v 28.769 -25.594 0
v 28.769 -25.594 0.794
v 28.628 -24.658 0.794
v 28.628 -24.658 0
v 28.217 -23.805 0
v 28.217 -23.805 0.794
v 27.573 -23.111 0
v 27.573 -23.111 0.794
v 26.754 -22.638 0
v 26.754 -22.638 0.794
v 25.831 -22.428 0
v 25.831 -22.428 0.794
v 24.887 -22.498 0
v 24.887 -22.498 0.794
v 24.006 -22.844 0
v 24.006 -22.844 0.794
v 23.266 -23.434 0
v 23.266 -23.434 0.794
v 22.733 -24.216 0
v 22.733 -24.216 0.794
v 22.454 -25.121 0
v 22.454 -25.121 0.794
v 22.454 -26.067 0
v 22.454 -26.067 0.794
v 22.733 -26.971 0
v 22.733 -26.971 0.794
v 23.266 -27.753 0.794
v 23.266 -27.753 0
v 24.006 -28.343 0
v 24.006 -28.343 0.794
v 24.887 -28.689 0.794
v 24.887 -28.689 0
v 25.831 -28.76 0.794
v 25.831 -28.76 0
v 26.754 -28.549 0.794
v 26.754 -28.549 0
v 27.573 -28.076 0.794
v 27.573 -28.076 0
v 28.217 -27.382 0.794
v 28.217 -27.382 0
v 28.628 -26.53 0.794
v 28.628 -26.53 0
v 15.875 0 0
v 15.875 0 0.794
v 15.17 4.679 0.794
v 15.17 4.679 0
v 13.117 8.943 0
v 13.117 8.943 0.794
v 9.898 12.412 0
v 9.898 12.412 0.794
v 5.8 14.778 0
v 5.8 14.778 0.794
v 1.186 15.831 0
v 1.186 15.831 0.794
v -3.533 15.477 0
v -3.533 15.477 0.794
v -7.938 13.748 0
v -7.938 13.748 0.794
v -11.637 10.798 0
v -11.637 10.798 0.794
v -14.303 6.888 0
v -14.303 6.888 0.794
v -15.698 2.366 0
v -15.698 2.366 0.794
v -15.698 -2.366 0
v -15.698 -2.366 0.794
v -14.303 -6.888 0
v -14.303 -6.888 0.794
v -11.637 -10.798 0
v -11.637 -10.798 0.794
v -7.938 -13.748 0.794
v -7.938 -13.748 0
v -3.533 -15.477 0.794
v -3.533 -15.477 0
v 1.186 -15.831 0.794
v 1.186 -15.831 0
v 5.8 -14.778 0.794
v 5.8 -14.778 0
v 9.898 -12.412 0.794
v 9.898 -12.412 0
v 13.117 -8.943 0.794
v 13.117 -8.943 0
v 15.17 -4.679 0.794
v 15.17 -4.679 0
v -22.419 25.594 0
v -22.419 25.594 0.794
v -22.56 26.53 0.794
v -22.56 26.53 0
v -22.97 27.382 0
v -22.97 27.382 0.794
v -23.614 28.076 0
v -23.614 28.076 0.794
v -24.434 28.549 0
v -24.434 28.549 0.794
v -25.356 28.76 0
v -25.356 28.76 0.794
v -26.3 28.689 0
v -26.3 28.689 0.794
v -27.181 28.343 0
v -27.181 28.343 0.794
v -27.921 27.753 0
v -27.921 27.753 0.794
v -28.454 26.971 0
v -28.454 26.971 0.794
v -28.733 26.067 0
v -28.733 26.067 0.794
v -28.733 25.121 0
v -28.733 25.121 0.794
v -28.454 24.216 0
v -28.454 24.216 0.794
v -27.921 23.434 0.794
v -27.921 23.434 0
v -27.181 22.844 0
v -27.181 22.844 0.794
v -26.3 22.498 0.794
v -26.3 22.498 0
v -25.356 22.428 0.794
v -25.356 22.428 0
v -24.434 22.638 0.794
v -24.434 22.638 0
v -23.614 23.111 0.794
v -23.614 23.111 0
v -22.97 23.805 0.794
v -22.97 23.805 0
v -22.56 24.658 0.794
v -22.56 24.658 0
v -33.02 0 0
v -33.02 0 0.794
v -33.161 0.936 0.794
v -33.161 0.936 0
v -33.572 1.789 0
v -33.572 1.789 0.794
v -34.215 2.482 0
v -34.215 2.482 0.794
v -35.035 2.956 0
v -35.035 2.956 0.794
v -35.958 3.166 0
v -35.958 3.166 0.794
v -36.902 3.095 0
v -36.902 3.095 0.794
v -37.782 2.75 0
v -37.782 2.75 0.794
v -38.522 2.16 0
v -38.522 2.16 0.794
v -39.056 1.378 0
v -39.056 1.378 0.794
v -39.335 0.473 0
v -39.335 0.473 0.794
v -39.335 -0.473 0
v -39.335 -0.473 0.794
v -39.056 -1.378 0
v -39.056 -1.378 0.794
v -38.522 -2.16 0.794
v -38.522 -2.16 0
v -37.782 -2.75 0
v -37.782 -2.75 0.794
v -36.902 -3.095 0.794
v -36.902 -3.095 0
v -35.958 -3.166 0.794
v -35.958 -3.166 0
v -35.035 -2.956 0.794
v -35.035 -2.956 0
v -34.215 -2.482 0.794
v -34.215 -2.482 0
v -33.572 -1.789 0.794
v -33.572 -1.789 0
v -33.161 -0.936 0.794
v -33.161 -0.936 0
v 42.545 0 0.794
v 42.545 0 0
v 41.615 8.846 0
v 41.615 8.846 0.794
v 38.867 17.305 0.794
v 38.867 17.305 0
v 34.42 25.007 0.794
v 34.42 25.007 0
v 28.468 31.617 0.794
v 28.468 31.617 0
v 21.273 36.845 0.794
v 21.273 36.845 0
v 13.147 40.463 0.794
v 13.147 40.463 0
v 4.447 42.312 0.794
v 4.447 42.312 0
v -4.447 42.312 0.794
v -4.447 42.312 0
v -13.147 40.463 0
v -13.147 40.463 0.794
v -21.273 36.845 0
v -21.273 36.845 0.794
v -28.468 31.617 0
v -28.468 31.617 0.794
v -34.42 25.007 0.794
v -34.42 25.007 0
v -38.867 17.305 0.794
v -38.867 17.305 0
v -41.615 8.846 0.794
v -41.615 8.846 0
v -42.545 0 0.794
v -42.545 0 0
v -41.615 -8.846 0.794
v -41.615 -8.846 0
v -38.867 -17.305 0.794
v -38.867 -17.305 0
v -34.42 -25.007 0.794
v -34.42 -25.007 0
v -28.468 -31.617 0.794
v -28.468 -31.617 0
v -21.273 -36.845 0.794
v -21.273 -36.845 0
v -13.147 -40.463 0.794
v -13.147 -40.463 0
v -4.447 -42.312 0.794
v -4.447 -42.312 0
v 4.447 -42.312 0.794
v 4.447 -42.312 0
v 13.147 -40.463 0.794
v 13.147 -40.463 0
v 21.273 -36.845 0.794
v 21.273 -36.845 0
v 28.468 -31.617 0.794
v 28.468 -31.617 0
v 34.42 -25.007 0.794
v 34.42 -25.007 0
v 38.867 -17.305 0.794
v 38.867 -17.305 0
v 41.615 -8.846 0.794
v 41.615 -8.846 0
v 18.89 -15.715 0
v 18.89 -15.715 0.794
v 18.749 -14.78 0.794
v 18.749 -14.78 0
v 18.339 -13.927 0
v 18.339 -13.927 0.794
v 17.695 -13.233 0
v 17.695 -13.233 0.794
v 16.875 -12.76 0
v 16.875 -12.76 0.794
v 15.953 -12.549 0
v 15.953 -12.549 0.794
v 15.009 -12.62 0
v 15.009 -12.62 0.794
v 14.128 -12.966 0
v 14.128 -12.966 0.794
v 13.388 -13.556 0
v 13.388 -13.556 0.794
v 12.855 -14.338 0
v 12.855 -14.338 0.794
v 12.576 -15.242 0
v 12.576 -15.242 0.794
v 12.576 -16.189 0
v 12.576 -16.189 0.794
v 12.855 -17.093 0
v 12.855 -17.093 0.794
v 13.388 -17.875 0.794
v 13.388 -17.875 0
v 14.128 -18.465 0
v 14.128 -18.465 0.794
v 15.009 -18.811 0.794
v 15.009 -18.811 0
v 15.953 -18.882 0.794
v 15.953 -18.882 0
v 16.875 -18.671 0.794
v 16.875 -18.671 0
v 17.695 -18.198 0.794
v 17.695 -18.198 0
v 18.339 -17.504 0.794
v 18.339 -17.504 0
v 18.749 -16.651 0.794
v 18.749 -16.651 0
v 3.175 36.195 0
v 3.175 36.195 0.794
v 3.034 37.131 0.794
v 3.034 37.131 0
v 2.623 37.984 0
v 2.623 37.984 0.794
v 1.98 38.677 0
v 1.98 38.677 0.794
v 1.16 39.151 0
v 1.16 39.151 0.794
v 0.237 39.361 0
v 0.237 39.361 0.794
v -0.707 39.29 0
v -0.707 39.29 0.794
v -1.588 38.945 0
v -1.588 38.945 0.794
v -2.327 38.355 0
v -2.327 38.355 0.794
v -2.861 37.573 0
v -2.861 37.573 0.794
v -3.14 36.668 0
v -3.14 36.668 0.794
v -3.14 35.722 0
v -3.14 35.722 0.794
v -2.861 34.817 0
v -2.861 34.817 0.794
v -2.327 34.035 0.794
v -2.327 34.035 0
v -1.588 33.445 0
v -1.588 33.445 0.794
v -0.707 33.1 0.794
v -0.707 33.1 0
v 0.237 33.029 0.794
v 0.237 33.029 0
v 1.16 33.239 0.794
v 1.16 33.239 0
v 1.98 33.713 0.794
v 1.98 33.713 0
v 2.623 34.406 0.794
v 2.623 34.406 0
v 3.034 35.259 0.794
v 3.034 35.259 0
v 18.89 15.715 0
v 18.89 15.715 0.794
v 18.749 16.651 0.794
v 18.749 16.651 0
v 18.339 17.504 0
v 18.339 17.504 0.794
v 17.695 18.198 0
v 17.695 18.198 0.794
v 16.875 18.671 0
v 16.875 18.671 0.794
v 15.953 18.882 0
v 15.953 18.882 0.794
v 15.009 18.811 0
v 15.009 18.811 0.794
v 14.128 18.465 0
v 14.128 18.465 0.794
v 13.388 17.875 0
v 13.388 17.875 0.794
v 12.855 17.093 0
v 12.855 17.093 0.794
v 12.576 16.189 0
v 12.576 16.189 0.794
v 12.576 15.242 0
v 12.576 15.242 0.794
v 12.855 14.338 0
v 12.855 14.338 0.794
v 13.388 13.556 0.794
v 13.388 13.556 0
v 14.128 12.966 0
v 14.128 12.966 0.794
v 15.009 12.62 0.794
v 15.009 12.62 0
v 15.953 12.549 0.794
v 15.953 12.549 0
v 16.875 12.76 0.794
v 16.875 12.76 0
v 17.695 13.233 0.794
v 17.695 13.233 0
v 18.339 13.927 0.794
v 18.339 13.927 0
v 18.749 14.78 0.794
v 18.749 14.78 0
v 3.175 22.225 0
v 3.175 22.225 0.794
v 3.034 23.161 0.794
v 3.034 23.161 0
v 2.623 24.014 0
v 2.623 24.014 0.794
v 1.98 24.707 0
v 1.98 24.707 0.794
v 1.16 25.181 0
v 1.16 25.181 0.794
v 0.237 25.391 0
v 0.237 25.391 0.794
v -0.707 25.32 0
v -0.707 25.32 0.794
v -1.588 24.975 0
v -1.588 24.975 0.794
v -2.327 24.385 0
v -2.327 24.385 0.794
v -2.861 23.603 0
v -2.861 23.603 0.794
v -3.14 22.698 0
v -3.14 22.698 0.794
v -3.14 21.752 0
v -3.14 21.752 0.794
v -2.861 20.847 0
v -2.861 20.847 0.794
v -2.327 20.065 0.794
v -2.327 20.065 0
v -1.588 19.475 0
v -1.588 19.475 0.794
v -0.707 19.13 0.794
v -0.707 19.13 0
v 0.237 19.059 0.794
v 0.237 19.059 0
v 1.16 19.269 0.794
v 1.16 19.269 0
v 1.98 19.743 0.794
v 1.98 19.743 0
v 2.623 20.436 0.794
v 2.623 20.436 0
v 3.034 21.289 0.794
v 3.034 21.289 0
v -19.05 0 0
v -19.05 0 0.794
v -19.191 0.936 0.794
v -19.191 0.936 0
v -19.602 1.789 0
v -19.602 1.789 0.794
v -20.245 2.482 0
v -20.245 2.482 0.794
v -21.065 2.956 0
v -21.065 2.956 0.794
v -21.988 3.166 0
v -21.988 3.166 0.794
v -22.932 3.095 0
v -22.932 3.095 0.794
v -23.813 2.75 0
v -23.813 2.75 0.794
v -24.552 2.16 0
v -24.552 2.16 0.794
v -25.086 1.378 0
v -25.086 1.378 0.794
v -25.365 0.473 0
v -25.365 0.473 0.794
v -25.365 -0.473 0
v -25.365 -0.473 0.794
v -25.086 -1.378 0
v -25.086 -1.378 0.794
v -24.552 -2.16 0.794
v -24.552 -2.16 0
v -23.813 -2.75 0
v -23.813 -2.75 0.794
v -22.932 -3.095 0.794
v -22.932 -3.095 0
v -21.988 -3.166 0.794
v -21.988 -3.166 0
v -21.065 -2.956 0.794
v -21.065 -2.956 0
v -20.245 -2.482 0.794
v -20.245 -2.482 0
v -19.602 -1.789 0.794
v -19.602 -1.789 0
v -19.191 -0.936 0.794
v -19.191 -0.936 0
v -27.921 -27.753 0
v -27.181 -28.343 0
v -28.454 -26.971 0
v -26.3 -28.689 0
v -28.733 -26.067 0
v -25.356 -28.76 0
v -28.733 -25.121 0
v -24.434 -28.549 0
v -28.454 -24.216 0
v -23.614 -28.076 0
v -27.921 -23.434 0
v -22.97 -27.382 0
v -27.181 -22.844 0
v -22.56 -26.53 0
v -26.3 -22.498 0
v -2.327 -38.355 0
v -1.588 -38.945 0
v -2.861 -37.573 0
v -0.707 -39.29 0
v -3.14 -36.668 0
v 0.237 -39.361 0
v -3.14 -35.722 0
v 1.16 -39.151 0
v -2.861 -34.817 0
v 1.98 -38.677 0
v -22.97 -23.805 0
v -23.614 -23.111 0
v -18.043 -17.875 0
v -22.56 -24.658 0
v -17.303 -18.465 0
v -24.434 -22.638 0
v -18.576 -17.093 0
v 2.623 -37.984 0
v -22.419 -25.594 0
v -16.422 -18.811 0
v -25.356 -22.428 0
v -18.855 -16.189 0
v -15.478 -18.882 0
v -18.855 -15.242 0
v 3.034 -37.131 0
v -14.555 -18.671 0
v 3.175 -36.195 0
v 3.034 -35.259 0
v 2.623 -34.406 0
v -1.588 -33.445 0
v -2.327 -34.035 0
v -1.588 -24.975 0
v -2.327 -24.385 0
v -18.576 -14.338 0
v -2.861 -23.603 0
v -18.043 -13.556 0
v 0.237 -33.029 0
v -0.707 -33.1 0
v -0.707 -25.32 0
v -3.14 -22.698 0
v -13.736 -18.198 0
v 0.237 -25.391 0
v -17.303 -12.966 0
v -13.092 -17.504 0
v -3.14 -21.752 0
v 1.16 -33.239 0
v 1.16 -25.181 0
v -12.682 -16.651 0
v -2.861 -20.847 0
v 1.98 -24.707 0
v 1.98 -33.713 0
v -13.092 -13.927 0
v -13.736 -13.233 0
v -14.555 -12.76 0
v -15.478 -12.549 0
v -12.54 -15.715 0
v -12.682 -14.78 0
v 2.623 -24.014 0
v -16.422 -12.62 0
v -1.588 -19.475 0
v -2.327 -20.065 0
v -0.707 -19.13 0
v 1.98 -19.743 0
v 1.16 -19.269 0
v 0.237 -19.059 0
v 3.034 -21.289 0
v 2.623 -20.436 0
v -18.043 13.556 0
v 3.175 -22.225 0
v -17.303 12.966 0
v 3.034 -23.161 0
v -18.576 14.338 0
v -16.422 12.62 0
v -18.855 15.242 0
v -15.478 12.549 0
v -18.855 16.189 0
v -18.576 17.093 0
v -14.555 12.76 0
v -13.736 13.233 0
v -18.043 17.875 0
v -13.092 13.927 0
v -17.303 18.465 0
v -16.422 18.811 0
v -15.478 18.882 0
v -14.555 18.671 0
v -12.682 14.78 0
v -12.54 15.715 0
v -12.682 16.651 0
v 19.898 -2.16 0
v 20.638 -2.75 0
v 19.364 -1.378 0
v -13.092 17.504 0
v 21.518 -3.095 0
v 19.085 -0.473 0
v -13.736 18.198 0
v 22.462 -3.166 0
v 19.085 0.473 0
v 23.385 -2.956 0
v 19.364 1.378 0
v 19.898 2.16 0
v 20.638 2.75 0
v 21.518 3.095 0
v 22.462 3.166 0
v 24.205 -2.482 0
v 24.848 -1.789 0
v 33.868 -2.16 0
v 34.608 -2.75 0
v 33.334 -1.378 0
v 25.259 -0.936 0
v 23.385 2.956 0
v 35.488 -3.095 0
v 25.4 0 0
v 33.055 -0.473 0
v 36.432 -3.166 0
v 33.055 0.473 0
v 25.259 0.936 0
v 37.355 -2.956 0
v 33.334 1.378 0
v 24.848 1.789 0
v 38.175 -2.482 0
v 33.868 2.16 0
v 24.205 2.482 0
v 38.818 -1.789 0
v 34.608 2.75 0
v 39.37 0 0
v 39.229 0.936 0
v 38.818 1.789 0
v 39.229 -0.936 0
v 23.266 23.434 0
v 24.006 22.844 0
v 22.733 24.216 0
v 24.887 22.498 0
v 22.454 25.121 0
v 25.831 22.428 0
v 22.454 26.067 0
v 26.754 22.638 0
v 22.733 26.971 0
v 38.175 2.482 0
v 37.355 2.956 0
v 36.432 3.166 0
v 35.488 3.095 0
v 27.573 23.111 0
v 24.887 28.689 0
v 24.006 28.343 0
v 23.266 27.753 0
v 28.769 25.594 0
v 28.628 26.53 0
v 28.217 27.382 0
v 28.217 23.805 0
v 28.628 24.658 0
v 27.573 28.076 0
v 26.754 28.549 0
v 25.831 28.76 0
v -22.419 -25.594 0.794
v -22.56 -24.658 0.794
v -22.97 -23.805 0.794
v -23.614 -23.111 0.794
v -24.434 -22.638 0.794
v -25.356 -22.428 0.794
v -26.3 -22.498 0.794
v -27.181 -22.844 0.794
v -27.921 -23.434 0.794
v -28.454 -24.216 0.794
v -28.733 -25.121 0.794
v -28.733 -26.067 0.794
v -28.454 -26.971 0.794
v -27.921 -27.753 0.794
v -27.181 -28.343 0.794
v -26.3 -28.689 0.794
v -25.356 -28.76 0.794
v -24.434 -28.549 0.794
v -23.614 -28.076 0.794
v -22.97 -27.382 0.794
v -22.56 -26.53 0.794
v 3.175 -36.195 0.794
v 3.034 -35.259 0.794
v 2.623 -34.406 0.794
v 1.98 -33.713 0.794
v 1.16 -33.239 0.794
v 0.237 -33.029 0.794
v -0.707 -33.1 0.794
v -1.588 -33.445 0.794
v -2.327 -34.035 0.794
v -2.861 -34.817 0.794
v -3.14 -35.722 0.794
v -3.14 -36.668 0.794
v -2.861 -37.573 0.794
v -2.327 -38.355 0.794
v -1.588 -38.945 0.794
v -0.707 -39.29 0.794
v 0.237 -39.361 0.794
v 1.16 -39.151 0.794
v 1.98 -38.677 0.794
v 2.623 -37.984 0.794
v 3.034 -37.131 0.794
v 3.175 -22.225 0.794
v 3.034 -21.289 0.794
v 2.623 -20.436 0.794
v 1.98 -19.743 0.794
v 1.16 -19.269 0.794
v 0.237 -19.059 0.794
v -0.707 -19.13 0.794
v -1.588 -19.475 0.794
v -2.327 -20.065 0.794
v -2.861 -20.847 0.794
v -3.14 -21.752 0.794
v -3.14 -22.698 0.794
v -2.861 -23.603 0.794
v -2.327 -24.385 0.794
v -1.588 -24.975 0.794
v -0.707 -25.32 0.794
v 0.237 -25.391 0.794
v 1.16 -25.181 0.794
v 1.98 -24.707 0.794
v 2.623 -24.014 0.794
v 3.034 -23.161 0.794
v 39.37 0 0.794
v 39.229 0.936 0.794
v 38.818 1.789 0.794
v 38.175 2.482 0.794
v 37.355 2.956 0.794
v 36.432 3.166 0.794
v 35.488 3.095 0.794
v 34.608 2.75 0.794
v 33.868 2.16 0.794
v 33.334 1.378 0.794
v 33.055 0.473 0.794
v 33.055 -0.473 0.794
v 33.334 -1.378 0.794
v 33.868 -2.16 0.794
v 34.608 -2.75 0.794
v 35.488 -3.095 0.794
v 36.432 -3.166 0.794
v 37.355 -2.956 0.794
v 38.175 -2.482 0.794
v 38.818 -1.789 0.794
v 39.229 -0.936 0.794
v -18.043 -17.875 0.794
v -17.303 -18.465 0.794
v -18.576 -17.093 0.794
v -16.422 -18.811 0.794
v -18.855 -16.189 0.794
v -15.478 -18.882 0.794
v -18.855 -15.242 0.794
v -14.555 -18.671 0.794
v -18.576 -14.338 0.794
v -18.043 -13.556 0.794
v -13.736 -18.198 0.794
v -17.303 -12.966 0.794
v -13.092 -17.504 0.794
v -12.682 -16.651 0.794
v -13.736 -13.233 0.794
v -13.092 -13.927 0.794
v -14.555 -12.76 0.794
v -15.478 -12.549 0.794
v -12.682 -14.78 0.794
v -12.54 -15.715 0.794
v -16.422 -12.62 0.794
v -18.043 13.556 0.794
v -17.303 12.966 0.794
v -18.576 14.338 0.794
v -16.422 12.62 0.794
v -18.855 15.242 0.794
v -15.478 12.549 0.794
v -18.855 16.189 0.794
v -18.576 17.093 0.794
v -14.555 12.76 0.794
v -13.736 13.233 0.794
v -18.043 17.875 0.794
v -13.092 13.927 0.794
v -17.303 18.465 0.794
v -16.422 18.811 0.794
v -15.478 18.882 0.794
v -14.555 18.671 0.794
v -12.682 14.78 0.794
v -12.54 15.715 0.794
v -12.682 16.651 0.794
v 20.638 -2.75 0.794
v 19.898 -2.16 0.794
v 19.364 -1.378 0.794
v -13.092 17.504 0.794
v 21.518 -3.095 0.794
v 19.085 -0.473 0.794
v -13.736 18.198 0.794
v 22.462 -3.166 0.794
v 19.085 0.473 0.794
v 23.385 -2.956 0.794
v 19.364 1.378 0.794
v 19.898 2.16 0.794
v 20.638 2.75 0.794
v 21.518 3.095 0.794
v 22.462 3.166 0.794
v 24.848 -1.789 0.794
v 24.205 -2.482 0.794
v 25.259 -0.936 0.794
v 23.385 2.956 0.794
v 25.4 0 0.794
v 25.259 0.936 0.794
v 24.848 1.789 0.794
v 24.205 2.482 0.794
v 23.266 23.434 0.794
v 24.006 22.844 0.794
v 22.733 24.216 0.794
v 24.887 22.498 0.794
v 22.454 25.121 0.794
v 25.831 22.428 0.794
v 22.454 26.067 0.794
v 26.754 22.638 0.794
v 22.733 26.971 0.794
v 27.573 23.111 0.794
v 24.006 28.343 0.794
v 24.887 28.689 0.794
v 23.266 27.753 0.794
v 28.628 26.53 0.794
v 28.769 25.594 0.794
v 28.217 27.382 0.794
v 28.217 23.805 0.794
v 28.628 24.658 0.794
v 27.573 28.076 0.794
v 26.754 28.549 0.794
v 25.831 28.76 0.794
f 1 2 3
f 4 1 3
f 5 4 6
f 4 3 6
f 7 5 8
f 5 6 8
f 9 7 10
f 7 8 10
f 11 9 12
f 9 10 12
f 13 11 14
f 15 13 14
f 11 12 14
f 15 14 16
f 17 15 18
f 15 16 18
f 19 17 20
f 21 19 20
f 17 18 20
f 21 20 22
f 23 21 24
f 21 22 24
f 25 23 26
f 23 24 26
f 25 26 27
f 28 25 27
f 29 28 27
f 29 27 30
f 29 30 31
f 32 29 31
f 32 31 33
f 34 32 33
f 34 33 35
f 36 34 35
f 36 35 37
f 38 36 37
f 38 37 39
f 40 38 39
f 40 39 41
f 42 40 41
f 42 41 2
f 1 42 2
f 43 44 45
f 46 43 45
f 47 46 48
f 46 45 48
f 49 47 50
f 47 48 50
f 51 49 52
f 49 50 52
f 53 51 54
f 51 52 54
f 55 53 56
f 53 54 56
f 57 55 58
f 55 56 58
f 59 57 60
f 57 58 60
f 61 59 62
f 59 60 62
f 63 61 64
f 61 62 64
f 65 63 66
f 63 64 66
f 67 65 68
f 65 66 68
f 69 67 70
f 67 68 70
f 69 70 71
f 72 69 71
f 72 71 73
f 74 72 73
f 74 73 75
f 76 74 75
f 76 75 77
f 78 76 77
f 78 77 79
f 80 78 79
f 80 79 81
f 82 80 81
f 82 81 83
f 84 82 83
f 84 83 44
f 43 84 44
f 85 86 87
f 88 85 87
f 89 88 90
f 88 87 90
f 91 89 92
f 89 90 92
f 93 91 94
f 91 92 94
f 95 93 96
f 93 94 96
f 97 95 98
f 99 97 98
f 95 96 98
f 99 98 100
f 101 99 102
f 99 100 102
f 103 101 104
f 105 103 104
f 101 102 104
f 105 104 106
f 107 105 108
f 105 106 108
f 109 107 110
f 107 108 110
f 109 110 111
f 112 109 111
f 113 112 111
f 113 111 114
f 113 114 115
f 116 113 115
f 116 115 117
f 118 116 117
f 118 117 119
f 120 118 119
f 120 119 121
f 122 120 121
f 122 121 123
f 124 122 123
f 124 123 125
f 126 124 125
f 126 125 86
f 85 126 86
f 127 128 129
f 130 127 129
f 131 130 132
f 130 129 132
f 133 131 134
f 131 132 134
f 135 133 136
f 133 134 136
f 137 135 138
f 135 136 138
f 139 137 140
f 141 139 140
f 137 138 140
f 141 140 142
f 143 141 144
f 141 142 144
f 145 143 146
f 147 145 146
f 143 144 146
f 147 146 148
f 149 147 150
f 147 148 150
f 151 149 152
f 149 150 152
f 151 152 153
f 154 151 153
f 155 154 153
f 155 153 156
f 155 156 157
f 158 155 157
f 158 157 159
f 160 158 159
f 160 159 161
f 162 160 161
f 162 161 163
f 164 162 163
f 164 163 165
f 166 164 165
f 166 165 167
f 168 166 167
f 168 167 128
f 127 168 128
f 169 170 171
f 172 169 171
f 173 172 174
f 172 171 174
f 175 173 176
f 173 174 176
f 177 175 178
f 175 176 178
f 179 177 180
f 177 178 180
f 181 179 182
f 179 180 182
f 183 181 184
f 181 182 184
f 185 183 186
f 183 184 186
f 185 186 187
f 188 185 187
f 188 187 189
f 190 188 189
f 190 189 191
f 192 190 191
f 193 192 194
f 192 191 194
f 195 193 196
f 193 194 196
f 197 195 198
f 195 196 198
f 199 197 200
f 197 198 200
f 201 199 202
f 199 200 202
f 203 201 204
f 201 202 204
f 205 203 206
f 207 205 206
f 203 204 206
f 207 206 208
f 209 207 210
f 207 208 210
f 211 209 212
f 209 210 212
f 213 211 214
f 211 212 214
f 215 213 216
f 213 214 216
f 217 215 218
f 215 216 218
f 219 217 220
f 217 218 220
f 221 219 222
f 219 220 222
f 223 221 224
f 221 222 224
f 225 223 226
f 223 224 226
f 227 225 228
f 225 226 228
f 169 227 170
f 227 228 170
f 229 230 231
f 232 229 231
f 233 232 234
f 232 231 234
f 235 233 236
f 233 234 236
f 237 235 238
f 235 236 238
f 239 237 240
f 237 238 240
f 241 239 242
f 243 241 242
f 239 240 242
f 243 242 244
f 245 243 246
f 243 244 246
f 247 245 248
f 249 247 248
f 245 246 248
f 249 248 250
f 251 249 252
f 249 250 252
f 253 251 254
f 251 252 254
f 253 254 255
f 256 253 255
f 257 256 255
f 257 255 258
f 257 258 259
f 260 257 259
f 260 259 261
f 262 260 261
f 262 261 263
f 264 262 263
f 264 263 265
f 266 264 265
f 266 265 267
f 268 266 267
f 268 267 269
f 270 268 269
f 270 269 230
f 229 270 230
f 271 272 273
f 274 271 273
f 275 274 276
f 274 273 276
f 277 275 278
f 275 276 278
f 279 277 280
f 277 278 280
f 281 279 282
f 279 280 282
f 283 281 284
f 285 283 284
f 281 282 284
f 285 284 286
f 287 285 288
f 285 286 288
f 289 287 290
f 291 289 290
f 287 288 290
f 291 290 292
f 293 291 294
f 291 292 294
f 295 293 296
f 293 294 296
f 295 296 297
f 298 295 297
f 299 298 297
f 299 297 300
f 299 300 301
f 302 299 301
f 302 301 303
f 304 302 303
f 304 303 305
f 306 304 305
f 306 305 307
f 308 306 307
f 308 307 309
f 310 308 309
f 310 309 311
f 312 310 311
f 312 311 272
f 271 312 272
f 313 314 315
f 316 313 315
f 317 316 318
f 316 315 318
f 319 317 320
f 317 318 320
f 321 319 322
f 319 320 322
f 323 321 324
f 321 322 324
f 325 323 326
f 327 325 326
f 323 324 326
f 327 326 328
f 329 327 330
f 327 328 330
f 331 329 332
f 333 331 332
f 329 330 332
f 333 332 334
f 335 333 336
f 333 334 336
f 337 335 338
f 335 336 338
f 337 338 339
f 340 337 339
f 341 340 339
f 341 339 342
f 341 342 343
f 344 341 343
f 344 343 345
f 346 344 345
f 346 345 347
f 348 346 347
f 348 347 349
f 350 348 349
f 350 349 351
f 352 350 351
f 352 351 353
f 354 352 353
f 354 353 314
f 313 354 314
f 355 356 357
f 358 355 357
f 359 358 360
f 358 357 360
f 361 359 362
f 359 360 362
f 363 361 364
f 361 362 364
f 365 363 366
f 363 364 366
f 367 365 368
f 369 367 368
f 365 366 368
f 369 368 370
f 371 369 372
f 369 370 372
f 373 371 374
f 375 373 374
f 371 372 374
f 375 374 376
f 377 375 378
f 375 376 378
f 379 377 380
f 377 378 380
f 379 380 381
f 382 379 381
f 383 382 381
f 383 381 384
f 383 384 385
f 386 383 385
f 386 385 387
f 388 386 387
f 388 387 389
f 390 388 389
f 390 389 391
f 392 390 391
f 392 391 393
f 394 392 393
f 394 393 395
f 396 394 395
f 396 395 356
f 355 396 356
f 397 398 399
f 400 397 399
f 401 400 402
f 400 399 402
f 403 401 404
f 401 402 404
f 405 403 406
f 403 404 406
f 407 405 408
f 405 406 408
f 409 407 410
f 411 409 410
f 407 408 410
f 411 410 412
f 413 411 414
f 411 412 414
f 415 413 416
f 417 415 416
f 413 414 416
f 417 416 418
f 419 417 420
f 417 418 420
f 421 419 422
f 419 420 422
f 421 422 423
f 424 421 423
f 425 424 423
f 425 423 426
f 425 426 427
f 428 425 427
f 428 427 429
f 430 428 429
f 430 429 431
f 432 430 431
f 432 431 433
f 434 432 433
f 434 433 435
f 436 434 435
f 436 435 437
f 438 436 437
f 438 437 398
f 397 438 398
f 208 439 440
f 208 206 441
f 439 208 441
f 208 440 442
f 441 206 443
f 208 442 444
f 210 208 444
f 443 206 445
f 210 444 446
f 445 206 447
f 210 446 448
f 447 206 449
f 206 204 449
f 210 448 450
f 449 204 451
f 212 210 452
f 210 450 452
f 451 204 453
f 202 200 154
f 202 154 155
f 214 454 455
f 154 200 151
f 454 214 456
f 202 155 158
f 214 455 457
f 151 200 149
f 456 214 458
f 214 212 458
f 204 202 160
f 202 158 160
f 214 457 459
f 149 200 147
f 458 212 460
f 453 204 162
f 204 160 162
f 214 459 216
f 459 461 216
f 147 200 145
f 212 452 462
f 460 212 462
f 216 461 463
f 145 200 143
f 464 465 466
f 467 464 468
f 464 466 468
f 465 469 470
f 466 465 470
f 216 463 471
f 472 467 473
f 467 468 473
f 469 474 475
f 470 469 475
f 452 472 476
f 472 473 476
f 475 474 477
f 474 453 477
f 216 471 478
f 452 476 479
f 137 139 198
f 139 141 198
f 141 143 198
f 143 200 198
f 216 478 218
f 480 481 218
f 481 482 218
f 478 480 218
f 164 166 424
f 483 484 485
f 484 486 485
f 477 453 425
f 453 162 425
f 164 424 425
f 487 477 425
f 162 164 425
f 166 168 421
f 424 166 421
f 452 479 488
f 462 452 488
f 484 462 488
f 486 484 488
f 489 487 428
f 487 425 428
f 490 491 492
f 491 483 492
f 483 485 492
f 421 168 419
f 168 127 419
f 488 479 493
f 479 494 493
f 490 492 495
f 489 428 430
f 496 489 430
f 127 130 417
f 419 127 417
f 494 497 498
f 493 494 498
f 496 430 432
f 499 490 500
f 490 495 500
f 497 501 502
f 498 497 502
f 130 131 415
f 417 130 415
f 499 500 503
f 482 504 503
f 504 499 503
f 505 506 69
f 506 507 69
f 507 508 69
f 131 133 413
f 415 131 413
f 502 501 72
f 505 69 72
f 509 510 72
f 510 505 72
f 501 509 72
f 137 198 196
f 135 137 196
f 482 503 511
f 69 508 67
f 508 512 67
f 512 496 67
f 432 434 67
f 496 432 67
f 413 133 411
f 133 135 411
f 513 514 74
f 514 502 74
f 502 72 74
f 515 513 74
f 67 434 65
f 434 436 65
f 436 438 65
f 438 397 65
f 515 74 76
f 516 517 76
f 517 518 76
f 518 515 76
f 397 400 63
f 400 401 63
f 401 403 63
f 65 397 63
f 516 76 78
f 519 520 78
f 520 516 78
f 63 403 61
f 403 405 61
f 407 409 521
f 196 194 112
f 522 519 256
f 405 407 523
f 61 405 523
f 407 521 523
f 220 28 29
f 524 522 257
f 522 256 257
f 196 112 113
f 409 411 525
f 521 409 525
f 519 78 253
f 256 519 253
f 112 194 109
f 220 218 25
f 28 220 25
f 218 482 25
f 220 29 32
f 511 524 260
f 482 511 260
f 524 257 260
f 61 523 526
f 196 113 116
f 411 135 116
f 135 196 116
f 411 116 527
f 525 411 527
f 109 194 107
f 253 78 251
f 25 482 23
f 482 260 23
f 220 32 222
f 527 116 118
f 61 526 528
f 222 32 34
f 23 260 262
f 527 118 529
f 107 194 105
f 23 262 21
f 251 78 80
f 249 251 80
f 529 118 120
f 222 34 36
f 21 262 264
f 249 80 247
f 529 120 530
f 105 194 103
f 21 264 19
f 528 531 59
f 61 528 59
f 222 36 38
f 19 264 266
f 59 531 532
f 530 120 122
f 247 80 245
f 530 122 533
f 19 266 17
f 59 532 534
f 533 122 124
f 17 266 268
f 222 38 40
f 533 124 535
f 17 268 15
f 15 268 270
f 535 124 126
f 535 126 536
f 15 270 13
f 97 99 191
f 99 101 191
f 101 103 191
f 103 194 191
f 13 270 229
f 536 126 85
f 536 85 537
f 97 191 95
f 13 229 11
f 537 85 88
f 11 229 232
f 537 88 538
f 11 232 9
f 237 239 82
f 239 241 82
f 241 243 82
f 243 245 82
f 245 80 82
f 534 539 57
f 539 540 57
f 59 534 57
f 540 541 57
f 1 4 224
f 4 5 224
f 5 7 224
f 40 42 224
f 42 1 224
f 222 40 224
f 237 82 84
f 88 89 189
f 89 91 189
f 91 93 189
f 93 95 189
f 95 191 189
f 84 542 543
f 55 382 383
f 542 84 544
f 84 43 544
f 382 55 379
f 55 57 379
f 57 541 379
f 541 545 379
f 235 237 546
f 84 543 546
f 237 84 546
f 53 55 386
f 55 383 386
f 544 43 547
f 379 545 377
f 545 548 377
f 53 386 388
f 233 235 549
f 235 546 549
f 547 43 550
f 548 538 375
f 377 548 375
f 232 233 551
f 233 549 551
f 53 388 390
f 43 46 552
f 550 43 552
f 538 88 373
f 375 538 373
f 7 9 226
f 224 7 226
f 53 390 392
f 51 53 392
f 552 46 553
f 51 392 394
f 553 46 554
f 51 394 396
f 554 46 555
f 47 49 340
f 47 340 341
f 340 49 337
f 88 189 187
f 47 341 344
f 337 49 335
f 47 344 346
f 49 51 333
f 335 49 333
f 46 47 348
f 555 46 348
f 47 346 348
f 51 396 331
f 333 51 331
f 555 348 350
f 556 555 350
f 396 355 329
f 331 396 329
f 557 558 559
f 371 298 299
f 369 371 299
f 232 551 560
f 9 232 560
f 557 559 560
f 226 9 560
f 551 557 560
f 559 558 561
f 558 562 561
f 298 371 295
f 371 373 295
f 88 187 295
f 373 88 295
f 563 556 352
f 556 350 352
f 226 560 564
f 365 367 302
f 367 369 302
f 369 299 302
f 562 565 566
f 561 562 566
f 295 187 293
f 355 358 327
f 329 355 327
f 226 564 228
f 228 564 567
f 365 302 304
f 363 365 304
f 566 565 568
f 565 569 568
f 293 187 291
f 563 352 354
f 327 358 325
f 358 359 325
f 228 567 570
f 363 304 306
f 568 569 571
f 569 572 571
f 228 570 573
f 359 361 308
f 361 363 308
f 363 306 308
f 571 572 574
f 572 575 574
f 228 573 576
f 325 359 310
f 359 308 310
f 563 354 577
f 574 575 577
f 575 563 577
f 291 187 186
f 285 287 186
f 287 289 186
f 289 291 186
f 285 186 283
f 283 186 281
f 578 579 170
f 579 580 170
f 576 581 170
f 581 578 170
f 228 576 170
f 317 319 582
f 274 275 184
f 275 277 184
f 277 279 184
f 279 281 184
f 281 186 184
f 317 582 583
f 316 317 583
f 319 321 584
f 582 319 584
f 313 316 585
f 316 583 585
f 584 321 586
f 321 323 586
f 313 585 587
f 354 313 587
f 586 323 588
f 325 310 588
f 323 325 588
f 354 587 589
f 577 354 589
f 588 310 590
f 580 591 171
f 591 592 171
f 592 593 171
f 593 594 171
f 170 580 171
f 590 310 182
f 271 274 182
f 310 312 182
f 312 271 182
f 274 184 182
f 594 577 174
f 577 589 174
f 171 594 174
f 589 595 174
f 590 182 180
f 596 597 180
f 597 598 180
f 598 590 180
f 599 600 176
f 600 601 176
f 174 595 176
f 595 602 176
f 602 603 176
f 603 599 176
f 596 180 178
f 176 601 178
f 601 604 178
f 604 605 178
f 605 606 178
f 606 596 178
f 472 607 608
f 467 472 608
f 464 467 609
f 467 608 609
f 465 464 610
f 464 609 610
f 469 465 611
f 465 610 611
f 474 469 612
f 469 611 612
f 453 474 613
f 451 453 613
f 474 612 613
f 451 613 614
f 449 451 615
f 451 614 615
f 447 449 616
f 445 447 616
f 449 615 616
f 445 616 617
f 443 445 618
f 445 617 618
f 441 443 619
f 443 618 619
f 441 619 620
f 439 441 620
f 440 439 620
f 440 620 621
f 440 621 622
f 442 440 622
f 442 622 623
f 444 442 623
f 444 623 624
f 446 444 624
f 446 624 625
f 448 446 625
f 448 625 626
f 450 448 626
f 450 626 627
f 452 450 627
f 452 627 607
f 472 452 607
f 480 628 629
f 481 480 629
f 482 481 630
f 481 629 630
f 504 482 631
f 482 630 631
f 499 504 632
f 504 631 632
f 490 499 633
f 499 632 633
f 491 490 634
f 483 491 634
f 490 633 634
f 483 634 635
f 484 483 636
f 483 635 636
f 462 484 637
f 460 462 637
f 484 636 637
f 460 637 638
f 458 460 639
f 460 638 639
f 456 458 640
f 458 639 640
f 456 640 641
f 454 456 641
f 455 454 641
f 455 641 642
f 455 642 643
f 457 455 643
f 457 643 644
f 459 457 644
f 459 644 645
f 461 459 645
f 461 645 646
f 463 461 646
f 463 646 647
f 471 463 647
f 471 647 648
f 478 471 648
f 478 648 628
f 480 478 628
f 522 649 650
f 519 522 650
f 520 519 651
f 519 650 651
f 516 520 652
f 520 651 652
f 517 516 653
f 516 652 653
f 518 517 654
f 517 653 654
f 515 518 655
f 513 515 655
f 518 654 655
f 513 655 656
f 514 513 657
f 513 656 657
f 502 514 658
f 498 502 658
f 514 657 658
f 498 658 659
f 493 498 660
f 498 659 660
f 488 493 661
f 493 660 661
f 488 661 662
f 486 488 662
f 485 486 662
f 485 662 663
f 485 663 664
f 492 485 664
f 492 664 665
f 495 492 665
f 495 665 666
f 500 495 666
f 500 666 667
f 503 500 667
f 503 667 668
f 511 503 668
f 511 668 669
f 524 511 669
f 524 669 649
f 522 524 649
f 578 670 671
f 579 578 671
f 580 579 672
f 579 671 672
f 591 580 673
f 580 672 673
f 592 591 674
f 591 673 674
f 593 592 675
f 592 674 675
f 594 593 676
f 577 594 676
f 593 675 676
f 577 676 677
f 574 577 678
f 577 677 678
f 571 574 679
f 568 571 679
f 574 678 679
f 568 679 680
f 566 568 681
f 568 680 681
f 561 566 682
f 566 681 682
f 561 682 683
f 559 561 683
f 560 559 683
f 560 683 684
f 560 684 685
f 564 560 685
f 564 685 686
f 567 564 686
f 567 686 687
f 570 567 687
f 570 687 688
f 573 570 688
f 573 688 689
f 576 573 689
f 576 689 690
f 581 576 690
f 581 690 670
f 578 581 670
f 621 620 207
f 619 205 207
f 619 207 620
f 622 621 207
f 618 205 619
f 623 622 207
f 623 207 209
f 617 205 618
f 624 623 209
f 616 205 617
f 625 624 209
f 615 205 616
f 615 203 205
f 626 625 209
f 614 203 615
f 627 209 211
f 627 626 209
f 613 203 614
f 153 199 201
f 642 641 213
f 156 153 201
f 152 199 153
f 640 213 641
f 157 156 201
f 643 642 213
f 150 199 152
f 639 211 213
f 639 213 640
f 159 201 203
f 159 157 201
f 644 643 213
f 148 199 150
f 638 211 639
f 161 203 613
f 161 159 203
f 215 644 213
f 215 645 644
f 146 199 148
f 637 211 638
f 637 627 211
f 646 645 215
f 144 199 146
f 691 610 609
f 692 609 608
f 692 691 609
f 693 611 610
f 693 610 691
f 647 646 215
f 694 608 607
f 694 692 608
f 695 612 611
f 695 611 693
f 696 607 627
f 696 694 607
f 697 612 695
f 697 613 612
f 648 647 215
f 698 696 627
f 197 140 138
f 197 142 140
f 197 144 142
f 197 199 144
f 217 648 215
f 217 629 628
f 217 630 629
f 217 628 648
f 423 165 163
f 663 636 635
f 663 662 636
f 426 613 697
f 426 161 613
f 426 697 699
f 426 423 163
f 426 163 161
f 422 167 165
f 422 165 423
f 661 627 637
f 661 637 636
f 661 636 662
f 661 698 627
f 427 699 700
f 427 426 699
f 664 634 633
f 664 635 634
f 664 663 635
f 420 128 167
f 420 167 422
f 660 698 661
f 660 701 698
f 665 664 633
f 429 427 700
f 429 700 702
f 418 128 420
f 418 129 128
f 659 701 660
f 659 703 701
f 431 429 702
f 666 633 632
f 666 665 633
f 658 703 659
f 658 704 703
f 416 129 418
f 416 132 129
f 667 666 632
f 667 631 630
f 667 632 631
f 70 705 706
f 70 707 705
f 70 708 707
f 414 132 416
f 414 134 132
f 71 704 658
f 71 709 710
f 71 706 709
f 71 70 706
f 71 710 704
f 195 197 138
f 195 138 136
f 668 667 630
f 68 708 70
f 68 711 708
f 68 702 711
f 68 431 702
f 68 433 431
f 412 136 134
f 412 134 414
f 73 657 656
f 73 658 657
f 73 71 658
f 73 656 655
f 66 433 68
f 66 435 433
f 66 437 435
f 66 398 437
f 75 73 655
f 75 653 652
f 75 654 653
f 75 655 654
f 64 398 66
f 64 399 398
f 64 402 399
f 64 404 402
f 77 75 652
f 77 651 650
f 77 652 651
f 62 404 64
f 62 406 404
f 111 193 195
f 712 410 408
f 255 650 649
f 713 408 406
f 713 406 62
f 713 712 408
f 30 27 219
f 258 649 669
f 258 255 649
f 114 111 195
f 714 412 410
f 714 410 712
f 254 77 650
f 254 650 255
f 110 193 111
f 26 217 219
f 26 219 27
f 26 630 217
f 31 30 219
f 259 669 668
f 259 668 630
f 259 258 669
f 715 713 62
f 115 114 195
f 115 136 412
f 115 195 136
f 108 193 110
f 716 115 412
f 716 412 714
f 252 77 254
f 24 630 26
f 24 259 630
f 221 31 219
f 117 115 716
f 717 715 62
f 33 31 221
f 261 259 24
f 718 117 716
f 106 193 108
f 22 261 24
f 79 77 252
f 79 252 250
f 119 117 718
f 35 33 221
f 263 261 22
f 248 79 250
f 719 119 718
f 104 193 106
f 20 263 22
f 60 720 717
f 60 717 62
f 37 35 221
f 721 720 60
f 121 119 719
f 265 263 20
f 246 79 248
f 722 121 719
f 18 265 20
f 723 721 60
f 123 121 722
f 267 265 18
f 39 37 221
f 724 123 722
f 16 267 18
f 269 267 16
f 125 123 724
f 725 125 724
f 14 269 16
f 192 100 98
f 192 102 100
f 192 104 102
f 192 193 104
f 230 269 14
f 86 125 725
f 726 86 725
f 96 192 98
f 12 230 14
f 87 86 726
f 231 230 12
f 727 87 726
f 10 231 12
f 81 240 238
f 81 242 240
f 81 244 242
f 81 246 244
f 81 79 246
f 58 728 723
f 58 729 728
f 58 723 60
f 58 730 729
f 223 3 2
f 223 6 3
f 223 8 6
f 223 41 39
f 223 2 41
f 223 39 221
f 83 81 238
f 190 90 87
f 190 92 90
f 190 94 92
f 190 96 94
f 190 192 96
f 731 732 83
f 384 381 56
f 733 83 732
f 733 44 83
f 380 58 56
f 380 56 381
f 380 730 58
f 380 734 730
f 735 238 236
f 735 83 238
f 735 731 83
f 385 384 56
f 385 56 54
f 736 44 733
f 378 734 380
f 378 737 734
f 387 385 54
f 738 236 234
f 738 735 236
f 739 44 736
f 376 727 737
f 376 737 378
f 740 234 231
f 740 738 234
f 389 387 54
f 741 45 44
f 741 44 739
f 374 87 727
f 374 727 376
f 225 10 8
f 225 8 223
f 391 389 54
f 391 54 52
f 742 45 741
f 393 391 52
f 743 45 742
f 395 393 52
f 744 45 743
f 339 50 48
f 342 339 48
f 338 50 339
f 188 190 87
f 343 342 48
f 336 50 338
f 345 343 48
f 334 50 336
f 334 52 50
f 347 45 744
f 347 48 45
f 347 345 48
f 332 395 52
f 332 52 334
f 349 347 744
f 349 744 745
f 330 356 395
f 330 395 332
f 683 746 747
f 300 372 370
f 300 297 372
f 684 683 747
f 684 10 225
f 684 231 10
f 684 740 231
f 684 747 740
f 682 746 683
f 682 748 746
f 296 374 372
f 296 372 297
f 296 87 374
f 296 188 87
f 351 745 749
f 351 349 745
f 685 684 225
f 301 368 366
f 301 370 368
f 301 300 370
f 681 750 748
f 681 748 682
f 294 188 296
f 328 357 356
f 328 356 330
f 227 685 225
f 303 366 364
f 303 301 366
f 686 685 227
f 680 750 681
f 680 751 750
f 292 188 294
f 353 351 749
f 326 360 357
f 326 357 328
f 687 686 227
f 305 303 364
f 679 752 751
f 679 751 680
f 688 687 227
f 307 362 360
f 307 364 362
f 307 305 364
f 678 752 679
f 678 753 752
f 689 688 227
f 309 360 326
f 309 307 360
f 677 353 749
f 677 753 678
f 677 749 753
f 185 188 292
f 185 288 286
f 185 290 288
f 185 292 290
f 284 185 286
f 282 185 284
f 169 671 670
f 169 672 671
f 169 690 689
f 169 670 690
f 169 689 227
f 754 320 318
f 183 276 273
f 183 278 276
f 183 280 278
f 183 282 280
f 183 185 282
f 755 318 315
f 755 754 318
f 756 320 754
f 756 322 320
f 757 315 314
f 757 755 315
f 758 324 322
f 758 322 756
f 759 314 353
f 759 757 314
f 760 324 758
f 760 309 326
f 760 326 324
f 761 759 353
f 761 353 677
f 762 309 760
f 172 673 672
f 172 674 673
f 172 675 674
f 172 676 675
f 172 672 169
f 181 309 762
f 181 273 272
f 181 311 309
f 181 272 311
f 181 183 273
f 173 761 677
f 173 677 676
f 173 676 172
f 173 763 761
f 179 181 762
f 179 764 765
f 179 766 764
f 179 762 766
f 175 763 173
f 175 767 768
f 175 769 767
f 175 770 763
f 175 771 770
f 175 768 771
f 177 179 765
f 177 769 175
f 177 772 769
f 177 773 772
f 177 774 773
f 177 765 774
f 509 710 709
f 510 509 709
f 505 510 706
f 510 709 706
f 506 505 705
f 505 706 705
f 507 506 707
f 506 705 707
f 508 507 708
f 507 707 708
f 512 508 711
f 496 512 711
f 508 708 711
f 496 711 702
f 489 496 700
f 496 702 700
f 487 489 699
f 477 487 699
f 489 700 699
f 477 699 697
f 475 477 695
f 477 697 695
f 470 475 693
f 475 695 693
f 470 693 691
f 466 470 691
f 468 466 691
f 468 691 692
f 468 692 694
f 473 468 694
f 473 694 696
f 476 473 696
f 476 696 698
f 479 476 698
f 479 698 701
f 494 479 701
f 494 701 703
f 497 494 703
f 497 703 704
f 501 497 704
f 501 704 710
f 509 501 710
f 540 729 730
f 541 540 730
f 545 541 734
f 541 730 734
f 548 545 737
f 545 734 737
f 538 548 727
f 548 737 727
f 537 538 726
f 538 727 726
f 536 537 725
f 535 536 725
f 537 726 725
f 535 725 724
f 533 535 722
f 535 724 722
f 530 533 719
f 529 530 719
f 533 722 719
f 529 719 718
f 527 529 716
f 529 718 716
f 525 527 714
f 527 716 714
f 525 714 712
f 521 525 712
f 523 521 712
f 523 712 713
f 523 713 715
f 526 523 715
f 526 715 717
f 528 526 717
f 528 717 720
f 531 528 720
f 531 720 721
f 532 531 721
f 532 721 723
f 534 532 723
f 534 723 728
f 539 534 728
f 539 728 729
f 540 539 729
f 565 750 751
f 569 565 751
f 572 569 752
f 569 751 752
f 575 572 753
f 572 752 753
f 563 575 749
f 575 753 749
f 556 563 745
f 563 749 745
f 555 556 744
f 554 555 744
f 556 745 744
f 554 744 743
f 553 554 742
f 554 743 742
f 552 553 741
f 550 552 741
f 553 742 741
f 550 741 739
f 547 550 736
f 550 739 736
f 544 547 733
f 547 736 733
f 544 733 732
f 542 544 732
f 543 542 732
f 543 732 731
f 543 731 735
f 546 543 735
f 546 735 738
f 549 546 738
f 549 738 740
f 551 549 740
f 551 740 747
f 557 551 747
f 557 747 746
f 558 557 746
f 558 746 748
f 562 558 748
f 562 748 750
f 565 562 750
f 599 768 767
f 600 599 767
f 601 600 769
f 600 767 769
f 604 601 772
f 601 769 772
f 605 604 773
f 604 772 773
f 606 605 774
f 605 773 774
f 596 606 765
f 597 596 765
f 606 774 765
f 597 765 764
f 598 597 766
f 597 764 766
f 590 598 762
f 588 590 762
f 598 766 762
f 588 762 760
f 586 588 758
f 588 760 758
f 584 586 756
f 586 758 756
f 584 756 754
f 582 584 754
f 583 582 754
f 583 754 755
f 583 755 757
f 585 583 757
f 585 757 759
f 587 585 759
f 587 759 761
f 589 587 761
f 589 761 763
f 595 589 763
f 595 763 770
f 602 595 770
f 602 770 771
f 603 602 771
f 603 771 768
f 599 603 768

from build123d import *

# Parameters (mm, degrees)
SKETCH4_R           = 42.545
BOSS_EXTRUDE2_DEPTH = 0.79375
SKETCH5_R           = 15.875
CUT_EXTRUDE5_DEPTH  = 1.79375
SKETCH9_R           = 3.175
CUT_EXTRUDE12_DEPTH = 1.79375


with BuildPart() as part:
    # Sketch4 → Boss-Extrude2 (new body)
    with BuildSketch(Plane.XY):
        Circle(SKETCH4_R)
    extrude(amount=BOSS_EXTRUDE2_DEPTH)

    # Sketch5 → Cut-Extrude5 (cut, through all)
    with BuildSketch(Plane.XY.offset(0.79375)):
        Circle(SKETCH5_R)
    extrude(amount=-CUT_EXTRUDE5_DEPTH, mode=Mode.SUBTRACT)

    # Sketch9 → Cut-Extrude12 (cut, through all)
    with BuildSketch(Plane.XY.offset(0.79375)):
        with Locations((22.225, 0)):
            Circle(SKETCH9_R)
        with Locations((36.195, 0)):
            Circle(SKETCH9_R)
        with Locations((15.715448212, -15.715448212)):
            Circle(SKETCH9_R)
        with Locations((25.593729945, -25.593729945)):
            Circle(SKETCH9_R)
        with Locations((0, -22.225)):
            Circle(SKETCH9_R)
        with Locations((0, -36.195)):
            Circle(SKETCH9_R)
        with Locations((-15.715448212, -15.715448212)):
            Circle(SKETCH9_R)
        with Locations((-25.593729945, -25.593729945)):
            Circle(SKETCH9_R)
        with Locations((-22.225, 0)):
            Circle(SKETCH9_R)
        with Locations((-36.195, 0)):
            Circle(SKETCH9_R)
        with Locations((-15.715448212, 15.715448212)):
            Circle(SKETCH9_R)
        with Locations((-25.593729945, 25.593729945)):
            Circle(SKETCH9_R)
        with Locations((0, 22.225)):
            Circle(SKETCH9_R)
        with Locations((0, 36.195)):
            Circle(SKETCH9_R)
        with Locations((15.715448212, 15.715448212)):
            Circle(SKETCH9_R)
        with Locations((25.593729945, 25.593729945)):
            Circle(SKETCH9_R)
    extrude(amount=-CUT_EXTRUDE12_DEPTH, mode=Mode.SUBTRACT)


solid = part.part
